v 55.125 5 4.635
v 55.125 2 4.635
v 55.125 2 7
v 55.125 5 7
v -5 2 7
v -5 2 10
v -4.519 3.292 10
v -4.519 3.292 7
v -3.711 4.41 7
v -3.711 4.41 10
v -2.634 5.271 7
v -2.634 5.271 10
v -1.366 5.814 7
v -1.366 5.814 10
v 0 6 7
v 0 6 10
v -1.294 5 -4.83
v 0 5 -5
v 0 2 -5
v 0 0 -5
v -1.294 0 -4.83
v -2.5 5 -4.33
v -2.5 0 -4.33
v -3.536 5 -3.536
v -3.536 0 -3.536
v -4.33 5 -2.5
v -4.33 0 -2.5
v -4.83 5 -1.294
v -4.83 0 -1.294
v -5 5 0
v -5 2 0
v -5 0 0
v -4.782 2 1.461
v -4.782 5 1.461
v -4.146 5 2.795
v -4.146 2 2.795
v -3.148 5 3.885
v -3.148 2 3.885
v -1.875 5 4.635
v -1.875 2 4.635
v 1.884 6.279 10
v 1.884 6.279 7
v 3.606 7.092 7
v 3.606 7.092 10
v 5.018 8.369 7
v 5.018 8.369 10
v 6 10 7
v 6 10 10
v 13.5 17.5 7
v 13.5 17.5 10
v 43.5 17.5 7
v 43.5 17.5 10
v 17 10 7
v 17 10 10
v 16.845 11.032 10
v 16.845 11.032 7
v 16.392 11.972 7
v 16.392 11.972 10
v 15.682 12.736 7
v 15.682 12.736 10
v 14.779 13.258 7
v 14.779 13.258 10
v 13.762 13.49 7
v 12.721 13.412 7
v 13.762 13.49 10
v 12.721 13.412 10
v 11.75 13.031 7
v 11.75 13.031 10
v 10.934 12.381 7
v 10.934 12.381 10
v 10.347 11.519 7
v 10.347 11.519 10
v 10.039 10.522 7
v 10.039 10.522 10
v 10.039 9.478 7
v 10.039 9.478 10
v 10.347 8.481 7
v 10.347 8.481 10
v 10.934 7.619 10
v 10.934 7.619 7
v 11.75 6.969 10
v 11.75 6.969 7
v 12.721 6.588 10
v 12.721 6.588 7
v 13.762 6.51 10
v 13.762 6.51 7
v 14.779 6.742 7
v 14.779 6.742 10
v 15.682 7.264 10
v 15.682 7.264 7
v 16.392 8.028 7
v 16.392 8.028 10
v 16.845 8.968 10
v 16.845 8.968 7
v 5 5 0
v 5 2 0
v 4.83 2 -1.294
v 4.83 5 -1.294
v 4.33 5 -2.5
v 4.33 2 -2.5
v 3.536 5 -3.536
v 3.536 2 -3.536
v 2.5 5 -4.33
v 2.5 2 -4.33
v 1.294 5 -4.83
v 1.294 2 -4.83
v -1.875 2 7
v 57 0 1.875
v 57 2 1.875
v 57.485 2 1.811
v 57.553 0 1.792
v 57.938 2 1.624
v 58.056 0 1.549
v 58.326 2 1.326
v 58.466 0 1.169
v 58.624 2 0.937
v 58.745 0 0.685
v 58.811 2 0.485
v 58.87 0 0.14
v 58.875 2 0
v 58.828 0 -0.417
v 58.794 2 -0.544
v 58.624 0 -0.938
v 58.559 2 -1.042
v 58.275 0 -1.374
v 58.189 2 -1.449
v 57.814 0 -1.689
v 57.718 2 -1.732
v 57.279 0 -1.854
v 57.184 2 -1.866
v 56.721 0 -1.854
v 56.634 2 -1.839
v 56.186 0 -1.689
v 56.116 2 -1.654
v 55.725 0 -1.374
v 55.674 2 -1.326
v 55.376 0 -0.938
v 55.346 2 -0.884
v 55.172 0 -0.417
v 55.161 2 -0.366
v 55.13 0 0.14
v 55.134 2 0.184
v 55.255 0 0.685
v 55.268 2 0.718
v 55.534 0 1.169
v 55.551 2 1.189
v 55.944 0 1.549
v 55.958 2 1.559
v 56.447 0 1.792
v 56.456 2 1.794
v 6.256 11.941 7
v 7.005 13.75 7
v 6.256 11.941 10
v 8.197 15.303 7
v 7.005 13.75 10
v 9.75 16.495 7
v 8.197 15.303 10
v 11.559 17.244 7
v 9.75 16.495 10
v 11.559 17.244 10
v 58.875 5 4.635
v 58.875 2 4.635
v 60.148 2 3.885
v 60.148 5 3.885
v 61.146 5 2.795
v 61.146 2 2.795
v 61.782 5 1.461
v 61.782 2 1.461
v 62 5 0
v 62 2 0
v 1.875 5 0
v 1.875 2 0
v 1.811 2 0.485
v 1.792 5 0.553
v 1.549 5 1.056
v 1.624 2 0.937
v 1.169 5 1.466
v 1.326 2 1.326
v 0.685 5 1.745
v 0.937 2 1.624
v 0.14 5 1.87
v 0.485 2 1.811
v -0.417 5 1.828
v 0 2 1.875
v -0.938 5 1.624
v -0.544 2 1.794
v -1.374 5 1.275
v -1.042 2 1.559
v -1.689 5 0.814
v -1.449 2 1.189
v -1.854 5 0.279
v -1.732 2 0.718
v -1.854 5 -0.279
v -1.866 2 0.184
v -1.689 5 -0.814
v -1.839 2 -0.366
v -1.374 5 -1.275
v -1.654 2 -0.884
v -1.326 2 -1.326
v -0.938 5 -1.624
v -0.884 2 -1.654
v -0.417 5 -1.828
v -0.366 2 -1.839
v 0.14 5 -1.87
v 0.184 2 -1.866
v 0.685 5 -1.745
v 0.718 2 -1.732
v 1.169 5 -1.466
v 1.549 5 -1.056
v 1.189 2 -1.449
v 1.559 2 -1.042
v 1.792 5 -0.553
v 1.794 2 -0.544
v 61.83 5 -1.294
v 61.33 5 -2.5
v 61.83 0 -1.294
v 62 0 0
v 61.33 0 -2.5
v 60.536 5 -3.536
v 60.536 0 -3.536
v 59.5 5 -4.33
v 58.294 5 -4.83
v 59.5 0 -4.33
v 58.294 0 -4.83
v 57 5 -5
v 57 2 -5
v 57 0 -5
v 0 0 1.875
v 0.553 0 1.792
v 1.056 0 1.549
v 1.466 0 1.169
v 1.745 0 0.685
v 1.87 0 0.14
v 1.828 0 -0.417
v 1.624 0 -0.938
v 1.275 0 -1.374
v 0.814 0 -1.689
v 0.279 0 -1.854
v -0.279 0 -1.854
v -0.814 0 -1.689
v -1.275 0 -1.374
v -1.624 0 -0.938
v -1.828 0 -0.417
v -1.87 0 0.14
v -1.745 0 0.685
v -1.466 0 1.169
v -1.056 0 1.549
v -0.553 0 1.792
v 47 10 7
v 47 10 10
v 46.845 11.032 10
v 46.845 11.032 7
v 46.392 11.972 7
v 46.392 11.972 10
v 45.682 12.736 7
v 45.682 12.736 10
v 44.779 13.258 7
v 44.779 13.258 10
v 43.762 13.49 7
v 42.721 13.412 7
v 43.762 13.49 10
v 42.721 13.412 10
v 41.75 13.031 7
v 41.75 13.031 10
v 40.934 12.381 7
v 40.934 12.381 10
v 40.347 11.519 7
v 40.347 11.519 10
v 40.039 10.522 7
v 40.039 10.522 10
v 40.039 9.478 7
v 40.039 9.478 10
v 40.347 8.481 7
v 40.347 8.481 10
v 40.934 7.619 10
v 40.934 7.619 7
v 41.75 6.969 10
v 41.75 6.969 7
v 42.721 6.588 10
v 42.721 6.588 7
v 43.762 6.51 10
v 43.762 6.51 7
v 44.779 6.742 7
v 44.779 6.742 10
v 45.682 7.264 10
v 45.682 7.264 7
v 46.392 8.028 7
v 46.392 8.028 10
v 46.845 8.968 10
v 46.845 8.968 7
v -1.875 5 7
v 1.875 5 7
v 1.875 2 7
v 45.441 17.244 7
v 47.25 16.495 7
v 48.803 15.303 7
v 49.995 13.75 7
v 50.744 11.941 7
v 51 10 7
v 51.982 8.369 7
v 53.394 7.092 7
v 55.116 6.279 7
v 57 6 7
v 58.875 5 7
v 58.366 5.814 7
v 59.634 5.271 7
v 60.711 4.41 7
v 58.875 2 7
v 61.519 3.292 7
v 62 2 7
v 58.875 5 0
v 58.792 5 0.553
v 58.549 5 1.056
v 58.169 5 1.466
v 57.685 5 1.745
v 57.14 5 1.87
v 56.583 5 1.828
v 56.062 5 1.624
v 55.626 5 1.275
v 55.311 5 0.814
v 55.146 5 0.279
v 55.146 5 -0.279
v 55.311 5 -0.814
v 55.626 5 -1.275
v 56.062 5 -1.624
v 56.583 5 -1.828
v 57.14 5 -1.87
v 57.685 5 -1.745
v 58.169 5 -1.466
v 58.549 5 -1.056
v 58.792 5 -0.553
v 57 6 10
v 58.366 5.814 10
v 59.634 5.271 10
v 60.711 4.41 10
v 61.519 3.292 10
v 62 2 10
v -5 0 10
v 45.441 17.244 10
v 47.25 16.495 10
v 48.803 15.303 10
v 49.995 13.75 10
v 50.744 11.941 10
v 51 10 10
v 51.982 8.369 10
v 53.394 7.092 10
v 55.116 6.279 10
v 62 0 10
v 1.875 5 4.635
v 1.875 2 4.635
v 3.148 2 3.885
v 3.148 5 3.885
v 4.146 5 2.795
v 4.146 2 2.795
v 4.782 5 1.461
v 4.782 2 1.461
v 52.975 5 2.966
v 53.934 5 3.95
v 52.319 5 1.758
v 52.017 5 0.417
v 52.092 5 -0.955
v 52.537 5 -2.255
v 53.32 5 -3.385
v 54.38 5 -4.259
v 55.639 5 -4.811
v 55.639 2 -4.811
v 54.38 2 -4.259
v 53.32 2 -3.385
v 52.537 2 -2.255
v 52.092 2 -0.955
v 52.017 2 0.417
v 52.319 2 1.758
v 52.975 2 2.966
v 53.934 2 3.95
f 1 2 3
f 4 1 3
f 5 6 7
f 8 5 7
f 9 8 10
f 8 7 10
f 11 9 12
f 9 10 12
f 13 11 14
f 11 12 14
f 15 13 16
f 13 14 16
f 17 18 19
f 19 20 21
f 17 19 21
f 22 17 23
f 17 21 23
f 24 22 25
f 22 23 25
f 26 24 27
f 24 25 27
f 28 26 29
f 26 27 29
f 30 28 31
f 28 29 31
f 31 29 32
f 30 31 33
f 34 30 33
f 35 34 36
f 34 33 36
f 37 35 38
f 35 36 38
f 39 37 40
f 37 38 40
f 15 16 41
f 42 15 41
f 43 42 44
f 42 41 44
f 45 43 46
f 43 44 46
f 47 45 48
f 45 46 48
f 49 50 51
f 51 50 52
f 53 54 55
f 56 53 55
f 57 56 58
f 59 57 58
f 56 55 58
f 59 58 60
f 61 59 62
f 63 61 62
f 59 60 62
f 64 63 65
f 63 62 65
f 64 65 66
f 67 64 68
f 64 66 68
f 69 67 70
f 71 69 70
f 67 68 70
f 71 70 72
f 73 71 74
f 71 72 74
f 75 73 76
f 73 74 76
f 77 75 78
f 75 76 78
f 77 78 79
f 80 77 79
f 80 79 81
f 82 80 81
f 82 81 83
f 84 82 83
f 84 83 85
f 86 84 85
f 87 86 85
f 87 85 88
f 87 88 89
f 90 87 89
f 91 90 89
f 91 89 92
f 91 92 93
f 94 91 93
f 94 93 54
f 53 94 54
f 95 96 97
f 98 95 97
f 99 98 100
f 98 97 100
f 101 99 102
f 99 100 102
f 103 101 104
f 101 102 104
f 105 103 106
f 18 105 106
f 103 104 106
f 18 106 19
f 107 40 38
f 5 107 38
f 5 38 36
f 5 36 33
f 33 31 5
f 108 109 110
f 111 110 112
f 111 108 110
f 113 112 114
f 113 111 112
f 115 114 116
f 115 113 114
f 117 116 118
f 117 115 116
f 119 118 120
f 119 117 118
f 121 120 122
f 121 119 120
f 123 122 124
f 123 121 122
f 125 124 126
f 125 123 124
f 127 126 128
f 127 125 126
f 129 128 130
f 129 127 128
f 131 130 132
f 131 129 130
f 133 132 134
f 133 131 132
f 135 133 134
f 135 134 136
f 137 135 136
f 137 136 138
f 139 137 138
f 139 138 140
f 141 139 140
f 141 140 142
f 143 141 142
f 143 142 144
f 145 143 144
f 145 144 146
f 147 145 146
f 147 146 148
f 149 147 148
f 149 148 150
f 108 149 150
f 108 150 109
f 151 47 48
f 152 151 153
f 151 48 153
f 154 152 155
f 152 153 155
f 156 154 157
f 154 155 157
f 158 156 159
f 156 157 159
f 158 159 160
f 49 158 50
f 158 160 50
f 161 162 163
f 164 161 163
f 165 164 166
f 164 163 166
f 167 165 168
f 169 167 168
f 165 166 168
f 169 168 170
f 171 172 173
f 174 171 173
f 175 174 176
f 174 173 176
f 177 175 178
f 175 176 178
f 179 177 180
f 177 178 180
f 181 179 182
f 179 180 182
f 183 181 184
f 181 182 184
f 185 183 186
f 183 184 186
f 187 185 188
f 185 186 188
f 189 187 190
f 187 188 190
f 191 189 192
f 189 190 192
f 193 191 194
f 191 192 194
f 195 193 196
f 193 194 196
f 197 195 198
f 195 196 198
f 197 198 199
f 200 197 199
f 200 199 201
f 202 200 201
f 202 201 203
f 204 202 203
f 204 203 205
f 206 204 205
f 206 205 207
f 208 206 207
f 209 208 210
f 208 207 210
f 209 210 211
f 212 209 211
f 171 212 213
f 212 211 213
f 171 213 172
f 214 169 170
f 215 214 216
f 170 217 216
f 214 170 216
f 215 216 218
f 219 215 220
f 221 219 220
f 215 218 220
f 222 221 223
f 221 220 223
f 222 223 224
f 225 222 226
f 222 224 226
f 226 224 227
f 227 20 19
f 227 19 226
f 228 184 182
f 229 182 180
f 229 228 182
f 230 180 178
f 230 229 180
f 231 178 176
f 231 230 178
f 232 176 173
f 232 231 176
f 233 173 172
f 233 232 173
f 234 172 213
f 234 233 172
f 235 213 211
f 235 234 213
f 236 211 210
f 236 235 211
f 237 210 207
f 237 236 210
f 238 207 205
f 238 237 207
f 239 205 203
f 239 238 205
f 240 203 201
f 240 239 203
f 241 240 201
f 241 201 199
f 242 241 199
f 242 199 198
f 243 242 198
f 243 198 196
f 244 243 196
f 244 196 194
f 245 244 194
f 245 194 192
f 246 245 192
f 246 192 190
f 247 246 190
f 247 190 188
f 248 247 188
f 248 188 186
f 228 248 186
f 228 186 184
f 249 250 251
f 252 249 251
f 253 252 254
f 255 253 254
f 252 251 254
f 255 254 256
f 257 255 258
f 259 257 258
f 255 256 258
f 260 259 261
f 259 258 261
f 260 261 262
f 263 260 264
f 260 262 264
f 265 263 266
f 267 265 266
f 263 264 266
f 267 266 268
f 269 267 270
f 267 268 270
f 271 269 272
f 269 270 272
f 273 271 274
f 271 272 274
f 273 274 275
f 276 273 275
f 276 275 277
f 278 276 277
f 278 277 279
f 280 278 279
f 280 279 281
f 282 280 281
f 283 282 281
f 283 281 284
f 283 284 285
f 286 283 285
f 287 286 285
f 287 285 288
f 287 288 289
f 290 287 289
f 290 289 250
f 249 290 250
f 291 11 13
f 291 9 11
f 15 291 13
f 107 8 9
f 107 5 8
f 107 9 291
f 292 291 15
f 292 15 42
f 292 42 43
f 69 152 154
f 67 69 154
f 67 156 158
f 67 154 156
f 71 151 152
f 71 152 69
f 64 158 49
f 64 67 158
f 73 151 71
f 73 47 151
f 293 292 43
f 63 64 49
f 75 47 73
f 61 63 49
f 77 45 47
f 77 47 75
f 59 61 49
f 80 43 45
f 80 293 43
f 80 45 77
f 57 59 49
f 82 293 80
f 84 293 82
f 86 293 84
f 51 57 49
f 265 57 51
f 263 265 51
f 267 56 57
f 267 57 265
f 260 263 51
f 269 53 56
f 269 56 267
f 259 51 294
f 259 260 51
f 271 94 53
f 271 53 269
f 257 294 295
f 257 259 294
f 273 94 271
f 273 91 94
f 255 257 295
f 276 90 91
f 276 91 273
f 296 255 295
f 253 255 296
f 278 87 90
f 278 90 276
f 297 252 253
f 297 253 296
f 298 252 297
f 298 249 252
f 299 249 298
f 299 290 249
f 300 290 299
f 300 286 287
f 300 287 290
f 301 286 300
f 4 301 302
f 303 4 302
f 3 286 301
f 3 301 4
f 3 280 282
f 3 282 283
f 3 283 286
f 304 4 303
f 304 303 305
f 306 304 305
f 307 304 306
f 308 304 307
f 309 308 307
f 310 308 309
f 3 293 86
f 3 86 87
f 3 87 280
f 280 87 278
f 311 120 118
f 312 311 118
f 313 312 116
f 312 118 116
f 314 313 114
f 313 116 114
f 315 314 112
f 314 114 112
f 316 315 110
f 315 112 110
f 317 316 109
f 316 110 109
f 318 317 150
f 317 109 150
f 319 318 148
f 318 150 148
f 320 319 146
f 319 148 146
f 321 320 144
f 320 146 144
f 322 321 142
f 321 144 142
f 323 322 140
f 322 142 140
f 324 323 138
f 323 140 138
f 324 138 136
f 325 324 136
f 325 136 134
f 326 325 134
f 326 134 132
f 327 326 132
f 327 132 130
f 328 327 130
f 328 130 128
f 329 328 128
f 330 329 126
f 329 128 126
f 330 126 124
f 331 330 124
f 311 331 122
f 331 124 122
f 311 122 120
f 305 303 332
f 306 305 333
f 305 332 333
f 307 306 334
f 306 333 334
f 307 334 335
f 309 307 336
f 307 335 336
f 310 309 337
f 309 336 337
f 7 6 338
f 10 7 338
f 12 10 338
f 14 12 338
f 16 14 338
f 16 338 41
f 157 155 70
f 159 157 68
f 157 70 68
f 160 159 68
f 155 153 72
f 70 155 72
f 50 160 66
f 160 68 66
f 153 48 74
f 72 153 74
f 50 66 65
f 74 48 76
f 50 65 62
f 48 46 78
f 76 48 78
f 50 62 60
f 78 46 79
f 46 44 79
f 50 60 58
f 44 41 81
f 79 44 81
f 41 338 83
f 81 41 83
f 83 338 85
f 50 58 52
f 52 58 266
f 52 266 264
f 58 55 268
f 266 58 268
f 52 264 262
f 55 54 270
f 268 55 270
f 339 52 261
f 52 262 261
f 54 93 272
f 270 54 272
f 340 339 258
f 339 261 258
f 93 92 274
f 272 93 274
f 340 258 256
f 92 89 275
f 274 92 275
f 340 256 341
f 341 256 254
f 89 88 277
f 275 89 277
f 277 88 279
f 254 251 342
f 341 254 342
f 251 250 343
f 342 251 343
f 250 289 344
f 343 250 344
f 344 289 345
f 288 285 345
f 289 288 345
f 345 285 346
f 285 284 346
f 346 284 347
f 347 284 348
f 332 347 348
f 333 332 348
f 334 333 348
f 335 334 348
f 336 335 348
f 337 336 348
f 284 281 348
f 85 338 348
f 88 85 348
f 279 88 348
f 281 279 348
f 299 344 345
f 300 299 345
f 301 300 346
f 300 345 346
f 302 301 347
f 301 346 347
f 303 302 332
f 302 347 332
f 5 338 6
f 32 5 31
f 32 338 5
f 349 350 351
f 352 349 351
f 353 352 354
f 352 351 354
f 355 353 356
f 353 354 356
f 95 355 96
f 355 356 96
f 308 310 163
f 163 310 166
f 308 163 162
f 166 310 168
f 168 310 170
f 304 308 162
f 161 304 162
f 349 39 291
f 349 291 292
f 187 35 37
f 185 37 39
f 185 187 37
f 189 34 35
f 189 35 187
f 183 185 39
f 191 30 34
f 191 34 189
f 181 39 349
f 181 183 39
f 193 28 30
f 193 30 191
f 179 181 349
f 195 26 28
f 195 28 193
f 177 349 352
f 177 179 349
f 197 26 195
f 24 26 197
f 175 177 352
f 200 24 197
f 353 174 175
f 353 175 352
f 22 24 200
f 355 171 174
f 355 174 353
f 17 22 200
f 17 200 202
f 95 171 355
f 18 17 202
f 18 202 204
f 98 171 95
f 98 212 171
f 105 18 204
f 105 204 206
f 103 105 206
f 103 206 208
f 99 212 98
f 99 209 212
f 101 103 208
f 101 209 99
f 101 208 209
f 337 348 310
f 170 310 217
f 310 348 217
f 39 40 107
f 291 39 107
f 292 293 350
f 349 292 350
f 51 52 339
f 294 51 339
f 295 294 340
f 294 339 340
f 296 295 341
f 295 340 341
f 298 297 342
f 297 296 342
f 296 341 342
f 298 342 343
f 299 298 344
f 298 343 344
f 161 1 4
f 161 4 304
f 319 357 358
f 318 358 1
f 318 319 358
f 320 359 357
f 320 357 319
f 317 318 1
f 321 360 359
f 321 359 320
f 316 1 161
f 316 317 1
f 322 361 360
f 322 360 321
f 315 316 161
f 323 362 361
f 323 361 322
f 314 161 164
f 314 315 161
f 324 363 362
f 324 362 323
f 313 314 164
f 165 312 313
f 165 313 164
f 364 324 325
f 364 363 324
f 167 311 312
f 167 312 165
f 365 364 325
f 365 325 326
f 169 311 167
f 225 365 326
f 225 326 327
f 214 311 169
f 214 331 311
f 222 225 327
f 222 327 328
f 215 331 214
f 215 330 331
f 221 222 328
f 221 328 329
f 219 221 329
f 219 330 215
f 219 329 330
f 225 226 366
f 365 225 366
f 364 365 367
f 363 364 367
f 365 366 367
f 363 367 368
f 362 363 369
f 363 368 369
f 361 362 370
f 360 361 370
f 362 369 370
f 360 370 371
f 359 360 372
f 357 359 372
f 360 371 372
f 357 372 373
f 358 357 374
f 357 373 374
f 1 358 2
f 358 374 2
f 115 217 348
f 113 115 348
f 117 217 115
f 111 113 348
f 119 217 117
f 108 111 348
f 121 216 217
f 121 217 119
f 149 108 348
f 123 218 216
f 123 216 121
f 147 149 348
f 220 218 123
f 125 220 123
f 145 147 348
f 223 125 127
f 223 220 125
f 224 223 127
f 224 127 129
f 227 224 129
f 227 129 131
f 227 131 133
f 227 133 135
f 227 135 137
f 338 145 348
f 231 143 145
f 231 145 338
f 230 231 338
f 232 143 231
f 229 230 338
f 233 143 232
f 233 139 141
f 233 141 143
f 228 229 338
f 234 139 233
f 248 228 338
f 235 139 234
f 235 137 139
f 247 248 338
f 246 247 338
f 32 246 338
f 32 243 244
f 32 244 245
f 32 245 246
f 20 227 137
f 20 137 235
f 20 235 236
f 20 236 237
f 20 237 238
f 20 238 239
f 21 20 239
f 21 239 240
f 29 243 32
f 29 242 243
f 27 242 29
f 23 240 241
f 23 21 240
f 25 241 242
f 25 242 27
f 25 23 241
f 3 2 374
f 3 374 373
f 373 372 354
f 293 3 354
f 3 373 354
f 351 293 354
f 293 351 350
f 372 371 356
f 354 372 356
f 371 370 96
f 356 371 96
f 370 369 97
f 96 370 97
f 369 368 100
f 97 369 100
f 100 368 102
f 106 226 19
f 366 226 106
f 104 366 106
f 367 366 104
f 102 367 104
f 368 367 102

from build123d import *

# Parameters (mm, degrees)
SKETCH1_R           = 1.875
BOSS_EXTRUDE1_DEPTH = 2
SKETCH2_W           = 3.125
SKETCH2_H           = 3
SKETCH2_W_2         = 3.75
SKETCH2_W_3         = 26.625
BOSS_EXTRUDE2_DEPTH = 3
SKETCH3_W           = 67
SKETCH3_H           = 3
BOSS_EXTRUDE3_DEPTH = 20
CUT_EXTRUDE1_REACH  = 70.513
SKETCH4_R           = 3.5


with BuildPart() as part:
    # Sketch1 → Boss-Extrude1 (new body)
    with BuildSketch(Plane(origin=(0, 0, 0), x_dir=(1, 0, 0), z_dir=(0, 1, 0))):
        with BuildLine():
            Line((0, 5), (57, 5))
            ThreePointArc((57, 5), (60.535533906, 3.535533906), (62, 0))
            Line((62, 0), (62, -10))
            Line((62, -10), (-5, -10))
            Line((-5, -10), (-5, 0))
            ThreePointArc((-5, 0), (-3.535533906, 3.535533906), (0, 5))
        make_face()
        with Locations(Location((0, 0, 0), (0, 0, 270))):
            Circle(SKETCH1_R, mode=Mode.SUBTRACT)
        with Locations(Location((57, 0, 0), (0, 0, 270))):
            Circle(SKETCH1_R, mode=Mode.SUBTRACT)
    extrude(amount=BOSS_EXTRUDE1_DEPTH)

    # Sketch2 → Boss-Extrude2 (add)
    with BuildSketch(Plane(origin=(0, 2, 0), x_dir=(1, 0, 0), z_dir=(0, 1, 0))):
        with BuildLine():
            ThreePointArc((0, 5), (-3.535533906, 3.535533906), (-5, 0))
            ThreePointArc((-5, 0), (-4.145780988, -2.795084972), (-1.875, -4.635124054))
            Line((-1.875, -4.635124054), (-1.875, 0))
            ThreePointArc((-1.875, 0), (0, 1.875), (1.875, 0))
            Line((1.875, 0), (1.875, -4.635124054))
            ThreePointArc((1.875, -4.635124054), (4.145780988, -2.795084972), (5, 0))
            ThreePointArc((5, 0), (3.535533906, 3.535533906), (0, 5))
        make_face()
        with BuildLine():
            Line((-1.875, 0), (-1.875, -4.635124054))
            ThreePointArc((-1.875, -4.635124054), (0, -5), (1.875, -4.635124054))
            Line((1.875, -4.635124054), (1.875, 0))
            ThreePointArc((1.875, 0), (0, -1.875), (-1.875, 0))
        make_face()
        with BuildLine():
            Line((-1.875, -4.635124054), (-1.875, -7))
            Line((-1.875, -7), (1.875, -7))
            Line((1.875, -7), (1.875, -4.635124054))
            ThreePointArc((1.875, -4.635124054), (0, -5), (-1.875, -4.635124054))
        make_face()
        with Locations((-3.4375, -8.5)):
            Rectangle(SKETCH2_W, SKETCH2_H)
        with Locations((0, -8.5)):
            Rectangle(SKETCH2_W_2, SKETCH2_H)
        with Locations((15.1875, -8.5)):
            Rectangle(SKETCH2_W_3, SKETCH2_H)
        with BuildLine():
            ThreePointArc((57, 5), (52.092066613, 0.955086312), (55.125, -4.635124054))
            Line((55.125, -4.635124054), (55.125, 0))
            ThreePointArc((55.125, 0), (57, 1.875), (58.875, 0))
            Line((58.875, 0), (58.875, -4.635124054))
            ThreePointArc((58.875, -4.635124054), (61.145780988, -2.795084972), (62, 0))
            ThreePointArc((62, 0), (60.535533906, 3.535533906), (57, 5))
        make_face()
        with BuildLine():
            Line((55.125, 0), (55.125, -4.635124054))
            ThreePointArc((55.125, -4.635124054), (57, -5), (58.875, -4.635124054))
            Line((58.875, -4.635124054), (58.875, 0))
            ThreePointArc((58.875, 0), (57, -1.875), (55.125, 0))
        make_face()
        with BuildLine():
            Line((55.125, -4.635124054), (55.125, -7))
            Line((55.125, -7), (58.875, -7))
            Line((58.875, -7), (58.875, -4.635124054))
            ThreePointArc((58.875, -4.635124054), (57, -5), (55.125, -4.635124054))
        make_face()
        with Locations((60.4375, -8.5)):
            Rectangle(SKETCH2_W, SKETCH2_H)
        with Locations((57, -8.5)):
            Rectangle(SKETCH2_W_2, SKETCH2_H)
        with Locations((41.8125, -8.5)):
            Rectangle(SKETCH2_W_3, SKETCH2_H)
    extrude(amount=BOSS_EXTRUDE2_DEPTH)

    # Sketch3 → Boss-Extrude3 (add)
    with BuildSketch(Plane(origin=(0, 5, 0), x_dir=(1, 0, 0), z_dir=(0, 1, 0))):
        with Locations((28.5, -8.5)):
            Rectangle(SKETCH3_W, SKETCH3_H)
    extrude(amount=BOSS_EXTRUDE3_DEPTH)

    # Sketch4 → Cut-Extrude1 (cut, up to next)
    with BuildSketch(Plane.XY.offset(10), mode=Mode.PRIVATE) as cut_extrude1_sk1:
        with BuildLine():
            ThreePointArc((-5, 2), (-3.201562119, 4.876952648), (0, 6))
            ThreePointArc((0, 6), (3.605551275, 7.091673087), (6, 10))
            ThreePointArc((6, 10), (8.196699141, 15.303300859), (13.5, 17.5))
            Line((13.5, 17.5), (43.5, 17.5))
            ThreePointArc((43.5, 17.5), (48.803300859, 15.303300859), (51, 10))
            ThreePointArc((51, 10), (53.394448725, 7.091673087), (57, 6))
            ThreePointArc((57, 6), (60.201562119, 4.876952648), (62, 2))
            Line((62, 2), (62, 25))
            Line((62, 25), (-5, 25))
            Line((-5, 25), (-5, 2))
        make_face()
    cut_extrude1_tool1 = extrude(cut_extrude1_sk1.sketch, amount=-CUT_EXTRUDE1_REACH, mode=Mode.PRIVATE) & part.part
    # Sketch4 → Cut-Extrude1 (cut, up to next)
    with BuildSketch(Plane.XY.offset(10), mode=Mode.PRIVATE) as cut_extrude1_sk2:
        with Locations((13.5, 10)):
            Circle(SKETCH4_R)
    cut_extrude1_tool2 = extrude(cut_extrude1_sk2.sketch, amount=-CUT_EXTRUDE1_REACH, mode=Mode.PRIVATE) & part.part
    # Sketch4 → Cut-Extrude1 (cut, up to next)
    with BuildSketch(Plane.XY.offset(10), mode=Mode.PRIVATE) as cut_extrude1_sk3:
        with Locations((43.5, 10)):
            Circle(SKETCH4_R)
    cut_extrude1_tool3 = extrude(cut_extrude1_sk3.sketch, amount=-CUT_EXTRUDE1_REACH, mode=Mode.PRIVATE) & part.part
    add(cut_extrude1_tool1.solids().sort_by_distance((28.5, 18.015348, 10))[0], mode=Mode.SUBTRACT)
    add(cut_extrude1_tool2.solids().sort_by_distance((13.5, 10, 10))[0], mode=Mode.SUBTRACT)
    add(cut_extrude1_tool3.solids().sort_by_distance((43.5, 10, 10))[0], mode=Mode.SUBTRACT)


solid = part.part
